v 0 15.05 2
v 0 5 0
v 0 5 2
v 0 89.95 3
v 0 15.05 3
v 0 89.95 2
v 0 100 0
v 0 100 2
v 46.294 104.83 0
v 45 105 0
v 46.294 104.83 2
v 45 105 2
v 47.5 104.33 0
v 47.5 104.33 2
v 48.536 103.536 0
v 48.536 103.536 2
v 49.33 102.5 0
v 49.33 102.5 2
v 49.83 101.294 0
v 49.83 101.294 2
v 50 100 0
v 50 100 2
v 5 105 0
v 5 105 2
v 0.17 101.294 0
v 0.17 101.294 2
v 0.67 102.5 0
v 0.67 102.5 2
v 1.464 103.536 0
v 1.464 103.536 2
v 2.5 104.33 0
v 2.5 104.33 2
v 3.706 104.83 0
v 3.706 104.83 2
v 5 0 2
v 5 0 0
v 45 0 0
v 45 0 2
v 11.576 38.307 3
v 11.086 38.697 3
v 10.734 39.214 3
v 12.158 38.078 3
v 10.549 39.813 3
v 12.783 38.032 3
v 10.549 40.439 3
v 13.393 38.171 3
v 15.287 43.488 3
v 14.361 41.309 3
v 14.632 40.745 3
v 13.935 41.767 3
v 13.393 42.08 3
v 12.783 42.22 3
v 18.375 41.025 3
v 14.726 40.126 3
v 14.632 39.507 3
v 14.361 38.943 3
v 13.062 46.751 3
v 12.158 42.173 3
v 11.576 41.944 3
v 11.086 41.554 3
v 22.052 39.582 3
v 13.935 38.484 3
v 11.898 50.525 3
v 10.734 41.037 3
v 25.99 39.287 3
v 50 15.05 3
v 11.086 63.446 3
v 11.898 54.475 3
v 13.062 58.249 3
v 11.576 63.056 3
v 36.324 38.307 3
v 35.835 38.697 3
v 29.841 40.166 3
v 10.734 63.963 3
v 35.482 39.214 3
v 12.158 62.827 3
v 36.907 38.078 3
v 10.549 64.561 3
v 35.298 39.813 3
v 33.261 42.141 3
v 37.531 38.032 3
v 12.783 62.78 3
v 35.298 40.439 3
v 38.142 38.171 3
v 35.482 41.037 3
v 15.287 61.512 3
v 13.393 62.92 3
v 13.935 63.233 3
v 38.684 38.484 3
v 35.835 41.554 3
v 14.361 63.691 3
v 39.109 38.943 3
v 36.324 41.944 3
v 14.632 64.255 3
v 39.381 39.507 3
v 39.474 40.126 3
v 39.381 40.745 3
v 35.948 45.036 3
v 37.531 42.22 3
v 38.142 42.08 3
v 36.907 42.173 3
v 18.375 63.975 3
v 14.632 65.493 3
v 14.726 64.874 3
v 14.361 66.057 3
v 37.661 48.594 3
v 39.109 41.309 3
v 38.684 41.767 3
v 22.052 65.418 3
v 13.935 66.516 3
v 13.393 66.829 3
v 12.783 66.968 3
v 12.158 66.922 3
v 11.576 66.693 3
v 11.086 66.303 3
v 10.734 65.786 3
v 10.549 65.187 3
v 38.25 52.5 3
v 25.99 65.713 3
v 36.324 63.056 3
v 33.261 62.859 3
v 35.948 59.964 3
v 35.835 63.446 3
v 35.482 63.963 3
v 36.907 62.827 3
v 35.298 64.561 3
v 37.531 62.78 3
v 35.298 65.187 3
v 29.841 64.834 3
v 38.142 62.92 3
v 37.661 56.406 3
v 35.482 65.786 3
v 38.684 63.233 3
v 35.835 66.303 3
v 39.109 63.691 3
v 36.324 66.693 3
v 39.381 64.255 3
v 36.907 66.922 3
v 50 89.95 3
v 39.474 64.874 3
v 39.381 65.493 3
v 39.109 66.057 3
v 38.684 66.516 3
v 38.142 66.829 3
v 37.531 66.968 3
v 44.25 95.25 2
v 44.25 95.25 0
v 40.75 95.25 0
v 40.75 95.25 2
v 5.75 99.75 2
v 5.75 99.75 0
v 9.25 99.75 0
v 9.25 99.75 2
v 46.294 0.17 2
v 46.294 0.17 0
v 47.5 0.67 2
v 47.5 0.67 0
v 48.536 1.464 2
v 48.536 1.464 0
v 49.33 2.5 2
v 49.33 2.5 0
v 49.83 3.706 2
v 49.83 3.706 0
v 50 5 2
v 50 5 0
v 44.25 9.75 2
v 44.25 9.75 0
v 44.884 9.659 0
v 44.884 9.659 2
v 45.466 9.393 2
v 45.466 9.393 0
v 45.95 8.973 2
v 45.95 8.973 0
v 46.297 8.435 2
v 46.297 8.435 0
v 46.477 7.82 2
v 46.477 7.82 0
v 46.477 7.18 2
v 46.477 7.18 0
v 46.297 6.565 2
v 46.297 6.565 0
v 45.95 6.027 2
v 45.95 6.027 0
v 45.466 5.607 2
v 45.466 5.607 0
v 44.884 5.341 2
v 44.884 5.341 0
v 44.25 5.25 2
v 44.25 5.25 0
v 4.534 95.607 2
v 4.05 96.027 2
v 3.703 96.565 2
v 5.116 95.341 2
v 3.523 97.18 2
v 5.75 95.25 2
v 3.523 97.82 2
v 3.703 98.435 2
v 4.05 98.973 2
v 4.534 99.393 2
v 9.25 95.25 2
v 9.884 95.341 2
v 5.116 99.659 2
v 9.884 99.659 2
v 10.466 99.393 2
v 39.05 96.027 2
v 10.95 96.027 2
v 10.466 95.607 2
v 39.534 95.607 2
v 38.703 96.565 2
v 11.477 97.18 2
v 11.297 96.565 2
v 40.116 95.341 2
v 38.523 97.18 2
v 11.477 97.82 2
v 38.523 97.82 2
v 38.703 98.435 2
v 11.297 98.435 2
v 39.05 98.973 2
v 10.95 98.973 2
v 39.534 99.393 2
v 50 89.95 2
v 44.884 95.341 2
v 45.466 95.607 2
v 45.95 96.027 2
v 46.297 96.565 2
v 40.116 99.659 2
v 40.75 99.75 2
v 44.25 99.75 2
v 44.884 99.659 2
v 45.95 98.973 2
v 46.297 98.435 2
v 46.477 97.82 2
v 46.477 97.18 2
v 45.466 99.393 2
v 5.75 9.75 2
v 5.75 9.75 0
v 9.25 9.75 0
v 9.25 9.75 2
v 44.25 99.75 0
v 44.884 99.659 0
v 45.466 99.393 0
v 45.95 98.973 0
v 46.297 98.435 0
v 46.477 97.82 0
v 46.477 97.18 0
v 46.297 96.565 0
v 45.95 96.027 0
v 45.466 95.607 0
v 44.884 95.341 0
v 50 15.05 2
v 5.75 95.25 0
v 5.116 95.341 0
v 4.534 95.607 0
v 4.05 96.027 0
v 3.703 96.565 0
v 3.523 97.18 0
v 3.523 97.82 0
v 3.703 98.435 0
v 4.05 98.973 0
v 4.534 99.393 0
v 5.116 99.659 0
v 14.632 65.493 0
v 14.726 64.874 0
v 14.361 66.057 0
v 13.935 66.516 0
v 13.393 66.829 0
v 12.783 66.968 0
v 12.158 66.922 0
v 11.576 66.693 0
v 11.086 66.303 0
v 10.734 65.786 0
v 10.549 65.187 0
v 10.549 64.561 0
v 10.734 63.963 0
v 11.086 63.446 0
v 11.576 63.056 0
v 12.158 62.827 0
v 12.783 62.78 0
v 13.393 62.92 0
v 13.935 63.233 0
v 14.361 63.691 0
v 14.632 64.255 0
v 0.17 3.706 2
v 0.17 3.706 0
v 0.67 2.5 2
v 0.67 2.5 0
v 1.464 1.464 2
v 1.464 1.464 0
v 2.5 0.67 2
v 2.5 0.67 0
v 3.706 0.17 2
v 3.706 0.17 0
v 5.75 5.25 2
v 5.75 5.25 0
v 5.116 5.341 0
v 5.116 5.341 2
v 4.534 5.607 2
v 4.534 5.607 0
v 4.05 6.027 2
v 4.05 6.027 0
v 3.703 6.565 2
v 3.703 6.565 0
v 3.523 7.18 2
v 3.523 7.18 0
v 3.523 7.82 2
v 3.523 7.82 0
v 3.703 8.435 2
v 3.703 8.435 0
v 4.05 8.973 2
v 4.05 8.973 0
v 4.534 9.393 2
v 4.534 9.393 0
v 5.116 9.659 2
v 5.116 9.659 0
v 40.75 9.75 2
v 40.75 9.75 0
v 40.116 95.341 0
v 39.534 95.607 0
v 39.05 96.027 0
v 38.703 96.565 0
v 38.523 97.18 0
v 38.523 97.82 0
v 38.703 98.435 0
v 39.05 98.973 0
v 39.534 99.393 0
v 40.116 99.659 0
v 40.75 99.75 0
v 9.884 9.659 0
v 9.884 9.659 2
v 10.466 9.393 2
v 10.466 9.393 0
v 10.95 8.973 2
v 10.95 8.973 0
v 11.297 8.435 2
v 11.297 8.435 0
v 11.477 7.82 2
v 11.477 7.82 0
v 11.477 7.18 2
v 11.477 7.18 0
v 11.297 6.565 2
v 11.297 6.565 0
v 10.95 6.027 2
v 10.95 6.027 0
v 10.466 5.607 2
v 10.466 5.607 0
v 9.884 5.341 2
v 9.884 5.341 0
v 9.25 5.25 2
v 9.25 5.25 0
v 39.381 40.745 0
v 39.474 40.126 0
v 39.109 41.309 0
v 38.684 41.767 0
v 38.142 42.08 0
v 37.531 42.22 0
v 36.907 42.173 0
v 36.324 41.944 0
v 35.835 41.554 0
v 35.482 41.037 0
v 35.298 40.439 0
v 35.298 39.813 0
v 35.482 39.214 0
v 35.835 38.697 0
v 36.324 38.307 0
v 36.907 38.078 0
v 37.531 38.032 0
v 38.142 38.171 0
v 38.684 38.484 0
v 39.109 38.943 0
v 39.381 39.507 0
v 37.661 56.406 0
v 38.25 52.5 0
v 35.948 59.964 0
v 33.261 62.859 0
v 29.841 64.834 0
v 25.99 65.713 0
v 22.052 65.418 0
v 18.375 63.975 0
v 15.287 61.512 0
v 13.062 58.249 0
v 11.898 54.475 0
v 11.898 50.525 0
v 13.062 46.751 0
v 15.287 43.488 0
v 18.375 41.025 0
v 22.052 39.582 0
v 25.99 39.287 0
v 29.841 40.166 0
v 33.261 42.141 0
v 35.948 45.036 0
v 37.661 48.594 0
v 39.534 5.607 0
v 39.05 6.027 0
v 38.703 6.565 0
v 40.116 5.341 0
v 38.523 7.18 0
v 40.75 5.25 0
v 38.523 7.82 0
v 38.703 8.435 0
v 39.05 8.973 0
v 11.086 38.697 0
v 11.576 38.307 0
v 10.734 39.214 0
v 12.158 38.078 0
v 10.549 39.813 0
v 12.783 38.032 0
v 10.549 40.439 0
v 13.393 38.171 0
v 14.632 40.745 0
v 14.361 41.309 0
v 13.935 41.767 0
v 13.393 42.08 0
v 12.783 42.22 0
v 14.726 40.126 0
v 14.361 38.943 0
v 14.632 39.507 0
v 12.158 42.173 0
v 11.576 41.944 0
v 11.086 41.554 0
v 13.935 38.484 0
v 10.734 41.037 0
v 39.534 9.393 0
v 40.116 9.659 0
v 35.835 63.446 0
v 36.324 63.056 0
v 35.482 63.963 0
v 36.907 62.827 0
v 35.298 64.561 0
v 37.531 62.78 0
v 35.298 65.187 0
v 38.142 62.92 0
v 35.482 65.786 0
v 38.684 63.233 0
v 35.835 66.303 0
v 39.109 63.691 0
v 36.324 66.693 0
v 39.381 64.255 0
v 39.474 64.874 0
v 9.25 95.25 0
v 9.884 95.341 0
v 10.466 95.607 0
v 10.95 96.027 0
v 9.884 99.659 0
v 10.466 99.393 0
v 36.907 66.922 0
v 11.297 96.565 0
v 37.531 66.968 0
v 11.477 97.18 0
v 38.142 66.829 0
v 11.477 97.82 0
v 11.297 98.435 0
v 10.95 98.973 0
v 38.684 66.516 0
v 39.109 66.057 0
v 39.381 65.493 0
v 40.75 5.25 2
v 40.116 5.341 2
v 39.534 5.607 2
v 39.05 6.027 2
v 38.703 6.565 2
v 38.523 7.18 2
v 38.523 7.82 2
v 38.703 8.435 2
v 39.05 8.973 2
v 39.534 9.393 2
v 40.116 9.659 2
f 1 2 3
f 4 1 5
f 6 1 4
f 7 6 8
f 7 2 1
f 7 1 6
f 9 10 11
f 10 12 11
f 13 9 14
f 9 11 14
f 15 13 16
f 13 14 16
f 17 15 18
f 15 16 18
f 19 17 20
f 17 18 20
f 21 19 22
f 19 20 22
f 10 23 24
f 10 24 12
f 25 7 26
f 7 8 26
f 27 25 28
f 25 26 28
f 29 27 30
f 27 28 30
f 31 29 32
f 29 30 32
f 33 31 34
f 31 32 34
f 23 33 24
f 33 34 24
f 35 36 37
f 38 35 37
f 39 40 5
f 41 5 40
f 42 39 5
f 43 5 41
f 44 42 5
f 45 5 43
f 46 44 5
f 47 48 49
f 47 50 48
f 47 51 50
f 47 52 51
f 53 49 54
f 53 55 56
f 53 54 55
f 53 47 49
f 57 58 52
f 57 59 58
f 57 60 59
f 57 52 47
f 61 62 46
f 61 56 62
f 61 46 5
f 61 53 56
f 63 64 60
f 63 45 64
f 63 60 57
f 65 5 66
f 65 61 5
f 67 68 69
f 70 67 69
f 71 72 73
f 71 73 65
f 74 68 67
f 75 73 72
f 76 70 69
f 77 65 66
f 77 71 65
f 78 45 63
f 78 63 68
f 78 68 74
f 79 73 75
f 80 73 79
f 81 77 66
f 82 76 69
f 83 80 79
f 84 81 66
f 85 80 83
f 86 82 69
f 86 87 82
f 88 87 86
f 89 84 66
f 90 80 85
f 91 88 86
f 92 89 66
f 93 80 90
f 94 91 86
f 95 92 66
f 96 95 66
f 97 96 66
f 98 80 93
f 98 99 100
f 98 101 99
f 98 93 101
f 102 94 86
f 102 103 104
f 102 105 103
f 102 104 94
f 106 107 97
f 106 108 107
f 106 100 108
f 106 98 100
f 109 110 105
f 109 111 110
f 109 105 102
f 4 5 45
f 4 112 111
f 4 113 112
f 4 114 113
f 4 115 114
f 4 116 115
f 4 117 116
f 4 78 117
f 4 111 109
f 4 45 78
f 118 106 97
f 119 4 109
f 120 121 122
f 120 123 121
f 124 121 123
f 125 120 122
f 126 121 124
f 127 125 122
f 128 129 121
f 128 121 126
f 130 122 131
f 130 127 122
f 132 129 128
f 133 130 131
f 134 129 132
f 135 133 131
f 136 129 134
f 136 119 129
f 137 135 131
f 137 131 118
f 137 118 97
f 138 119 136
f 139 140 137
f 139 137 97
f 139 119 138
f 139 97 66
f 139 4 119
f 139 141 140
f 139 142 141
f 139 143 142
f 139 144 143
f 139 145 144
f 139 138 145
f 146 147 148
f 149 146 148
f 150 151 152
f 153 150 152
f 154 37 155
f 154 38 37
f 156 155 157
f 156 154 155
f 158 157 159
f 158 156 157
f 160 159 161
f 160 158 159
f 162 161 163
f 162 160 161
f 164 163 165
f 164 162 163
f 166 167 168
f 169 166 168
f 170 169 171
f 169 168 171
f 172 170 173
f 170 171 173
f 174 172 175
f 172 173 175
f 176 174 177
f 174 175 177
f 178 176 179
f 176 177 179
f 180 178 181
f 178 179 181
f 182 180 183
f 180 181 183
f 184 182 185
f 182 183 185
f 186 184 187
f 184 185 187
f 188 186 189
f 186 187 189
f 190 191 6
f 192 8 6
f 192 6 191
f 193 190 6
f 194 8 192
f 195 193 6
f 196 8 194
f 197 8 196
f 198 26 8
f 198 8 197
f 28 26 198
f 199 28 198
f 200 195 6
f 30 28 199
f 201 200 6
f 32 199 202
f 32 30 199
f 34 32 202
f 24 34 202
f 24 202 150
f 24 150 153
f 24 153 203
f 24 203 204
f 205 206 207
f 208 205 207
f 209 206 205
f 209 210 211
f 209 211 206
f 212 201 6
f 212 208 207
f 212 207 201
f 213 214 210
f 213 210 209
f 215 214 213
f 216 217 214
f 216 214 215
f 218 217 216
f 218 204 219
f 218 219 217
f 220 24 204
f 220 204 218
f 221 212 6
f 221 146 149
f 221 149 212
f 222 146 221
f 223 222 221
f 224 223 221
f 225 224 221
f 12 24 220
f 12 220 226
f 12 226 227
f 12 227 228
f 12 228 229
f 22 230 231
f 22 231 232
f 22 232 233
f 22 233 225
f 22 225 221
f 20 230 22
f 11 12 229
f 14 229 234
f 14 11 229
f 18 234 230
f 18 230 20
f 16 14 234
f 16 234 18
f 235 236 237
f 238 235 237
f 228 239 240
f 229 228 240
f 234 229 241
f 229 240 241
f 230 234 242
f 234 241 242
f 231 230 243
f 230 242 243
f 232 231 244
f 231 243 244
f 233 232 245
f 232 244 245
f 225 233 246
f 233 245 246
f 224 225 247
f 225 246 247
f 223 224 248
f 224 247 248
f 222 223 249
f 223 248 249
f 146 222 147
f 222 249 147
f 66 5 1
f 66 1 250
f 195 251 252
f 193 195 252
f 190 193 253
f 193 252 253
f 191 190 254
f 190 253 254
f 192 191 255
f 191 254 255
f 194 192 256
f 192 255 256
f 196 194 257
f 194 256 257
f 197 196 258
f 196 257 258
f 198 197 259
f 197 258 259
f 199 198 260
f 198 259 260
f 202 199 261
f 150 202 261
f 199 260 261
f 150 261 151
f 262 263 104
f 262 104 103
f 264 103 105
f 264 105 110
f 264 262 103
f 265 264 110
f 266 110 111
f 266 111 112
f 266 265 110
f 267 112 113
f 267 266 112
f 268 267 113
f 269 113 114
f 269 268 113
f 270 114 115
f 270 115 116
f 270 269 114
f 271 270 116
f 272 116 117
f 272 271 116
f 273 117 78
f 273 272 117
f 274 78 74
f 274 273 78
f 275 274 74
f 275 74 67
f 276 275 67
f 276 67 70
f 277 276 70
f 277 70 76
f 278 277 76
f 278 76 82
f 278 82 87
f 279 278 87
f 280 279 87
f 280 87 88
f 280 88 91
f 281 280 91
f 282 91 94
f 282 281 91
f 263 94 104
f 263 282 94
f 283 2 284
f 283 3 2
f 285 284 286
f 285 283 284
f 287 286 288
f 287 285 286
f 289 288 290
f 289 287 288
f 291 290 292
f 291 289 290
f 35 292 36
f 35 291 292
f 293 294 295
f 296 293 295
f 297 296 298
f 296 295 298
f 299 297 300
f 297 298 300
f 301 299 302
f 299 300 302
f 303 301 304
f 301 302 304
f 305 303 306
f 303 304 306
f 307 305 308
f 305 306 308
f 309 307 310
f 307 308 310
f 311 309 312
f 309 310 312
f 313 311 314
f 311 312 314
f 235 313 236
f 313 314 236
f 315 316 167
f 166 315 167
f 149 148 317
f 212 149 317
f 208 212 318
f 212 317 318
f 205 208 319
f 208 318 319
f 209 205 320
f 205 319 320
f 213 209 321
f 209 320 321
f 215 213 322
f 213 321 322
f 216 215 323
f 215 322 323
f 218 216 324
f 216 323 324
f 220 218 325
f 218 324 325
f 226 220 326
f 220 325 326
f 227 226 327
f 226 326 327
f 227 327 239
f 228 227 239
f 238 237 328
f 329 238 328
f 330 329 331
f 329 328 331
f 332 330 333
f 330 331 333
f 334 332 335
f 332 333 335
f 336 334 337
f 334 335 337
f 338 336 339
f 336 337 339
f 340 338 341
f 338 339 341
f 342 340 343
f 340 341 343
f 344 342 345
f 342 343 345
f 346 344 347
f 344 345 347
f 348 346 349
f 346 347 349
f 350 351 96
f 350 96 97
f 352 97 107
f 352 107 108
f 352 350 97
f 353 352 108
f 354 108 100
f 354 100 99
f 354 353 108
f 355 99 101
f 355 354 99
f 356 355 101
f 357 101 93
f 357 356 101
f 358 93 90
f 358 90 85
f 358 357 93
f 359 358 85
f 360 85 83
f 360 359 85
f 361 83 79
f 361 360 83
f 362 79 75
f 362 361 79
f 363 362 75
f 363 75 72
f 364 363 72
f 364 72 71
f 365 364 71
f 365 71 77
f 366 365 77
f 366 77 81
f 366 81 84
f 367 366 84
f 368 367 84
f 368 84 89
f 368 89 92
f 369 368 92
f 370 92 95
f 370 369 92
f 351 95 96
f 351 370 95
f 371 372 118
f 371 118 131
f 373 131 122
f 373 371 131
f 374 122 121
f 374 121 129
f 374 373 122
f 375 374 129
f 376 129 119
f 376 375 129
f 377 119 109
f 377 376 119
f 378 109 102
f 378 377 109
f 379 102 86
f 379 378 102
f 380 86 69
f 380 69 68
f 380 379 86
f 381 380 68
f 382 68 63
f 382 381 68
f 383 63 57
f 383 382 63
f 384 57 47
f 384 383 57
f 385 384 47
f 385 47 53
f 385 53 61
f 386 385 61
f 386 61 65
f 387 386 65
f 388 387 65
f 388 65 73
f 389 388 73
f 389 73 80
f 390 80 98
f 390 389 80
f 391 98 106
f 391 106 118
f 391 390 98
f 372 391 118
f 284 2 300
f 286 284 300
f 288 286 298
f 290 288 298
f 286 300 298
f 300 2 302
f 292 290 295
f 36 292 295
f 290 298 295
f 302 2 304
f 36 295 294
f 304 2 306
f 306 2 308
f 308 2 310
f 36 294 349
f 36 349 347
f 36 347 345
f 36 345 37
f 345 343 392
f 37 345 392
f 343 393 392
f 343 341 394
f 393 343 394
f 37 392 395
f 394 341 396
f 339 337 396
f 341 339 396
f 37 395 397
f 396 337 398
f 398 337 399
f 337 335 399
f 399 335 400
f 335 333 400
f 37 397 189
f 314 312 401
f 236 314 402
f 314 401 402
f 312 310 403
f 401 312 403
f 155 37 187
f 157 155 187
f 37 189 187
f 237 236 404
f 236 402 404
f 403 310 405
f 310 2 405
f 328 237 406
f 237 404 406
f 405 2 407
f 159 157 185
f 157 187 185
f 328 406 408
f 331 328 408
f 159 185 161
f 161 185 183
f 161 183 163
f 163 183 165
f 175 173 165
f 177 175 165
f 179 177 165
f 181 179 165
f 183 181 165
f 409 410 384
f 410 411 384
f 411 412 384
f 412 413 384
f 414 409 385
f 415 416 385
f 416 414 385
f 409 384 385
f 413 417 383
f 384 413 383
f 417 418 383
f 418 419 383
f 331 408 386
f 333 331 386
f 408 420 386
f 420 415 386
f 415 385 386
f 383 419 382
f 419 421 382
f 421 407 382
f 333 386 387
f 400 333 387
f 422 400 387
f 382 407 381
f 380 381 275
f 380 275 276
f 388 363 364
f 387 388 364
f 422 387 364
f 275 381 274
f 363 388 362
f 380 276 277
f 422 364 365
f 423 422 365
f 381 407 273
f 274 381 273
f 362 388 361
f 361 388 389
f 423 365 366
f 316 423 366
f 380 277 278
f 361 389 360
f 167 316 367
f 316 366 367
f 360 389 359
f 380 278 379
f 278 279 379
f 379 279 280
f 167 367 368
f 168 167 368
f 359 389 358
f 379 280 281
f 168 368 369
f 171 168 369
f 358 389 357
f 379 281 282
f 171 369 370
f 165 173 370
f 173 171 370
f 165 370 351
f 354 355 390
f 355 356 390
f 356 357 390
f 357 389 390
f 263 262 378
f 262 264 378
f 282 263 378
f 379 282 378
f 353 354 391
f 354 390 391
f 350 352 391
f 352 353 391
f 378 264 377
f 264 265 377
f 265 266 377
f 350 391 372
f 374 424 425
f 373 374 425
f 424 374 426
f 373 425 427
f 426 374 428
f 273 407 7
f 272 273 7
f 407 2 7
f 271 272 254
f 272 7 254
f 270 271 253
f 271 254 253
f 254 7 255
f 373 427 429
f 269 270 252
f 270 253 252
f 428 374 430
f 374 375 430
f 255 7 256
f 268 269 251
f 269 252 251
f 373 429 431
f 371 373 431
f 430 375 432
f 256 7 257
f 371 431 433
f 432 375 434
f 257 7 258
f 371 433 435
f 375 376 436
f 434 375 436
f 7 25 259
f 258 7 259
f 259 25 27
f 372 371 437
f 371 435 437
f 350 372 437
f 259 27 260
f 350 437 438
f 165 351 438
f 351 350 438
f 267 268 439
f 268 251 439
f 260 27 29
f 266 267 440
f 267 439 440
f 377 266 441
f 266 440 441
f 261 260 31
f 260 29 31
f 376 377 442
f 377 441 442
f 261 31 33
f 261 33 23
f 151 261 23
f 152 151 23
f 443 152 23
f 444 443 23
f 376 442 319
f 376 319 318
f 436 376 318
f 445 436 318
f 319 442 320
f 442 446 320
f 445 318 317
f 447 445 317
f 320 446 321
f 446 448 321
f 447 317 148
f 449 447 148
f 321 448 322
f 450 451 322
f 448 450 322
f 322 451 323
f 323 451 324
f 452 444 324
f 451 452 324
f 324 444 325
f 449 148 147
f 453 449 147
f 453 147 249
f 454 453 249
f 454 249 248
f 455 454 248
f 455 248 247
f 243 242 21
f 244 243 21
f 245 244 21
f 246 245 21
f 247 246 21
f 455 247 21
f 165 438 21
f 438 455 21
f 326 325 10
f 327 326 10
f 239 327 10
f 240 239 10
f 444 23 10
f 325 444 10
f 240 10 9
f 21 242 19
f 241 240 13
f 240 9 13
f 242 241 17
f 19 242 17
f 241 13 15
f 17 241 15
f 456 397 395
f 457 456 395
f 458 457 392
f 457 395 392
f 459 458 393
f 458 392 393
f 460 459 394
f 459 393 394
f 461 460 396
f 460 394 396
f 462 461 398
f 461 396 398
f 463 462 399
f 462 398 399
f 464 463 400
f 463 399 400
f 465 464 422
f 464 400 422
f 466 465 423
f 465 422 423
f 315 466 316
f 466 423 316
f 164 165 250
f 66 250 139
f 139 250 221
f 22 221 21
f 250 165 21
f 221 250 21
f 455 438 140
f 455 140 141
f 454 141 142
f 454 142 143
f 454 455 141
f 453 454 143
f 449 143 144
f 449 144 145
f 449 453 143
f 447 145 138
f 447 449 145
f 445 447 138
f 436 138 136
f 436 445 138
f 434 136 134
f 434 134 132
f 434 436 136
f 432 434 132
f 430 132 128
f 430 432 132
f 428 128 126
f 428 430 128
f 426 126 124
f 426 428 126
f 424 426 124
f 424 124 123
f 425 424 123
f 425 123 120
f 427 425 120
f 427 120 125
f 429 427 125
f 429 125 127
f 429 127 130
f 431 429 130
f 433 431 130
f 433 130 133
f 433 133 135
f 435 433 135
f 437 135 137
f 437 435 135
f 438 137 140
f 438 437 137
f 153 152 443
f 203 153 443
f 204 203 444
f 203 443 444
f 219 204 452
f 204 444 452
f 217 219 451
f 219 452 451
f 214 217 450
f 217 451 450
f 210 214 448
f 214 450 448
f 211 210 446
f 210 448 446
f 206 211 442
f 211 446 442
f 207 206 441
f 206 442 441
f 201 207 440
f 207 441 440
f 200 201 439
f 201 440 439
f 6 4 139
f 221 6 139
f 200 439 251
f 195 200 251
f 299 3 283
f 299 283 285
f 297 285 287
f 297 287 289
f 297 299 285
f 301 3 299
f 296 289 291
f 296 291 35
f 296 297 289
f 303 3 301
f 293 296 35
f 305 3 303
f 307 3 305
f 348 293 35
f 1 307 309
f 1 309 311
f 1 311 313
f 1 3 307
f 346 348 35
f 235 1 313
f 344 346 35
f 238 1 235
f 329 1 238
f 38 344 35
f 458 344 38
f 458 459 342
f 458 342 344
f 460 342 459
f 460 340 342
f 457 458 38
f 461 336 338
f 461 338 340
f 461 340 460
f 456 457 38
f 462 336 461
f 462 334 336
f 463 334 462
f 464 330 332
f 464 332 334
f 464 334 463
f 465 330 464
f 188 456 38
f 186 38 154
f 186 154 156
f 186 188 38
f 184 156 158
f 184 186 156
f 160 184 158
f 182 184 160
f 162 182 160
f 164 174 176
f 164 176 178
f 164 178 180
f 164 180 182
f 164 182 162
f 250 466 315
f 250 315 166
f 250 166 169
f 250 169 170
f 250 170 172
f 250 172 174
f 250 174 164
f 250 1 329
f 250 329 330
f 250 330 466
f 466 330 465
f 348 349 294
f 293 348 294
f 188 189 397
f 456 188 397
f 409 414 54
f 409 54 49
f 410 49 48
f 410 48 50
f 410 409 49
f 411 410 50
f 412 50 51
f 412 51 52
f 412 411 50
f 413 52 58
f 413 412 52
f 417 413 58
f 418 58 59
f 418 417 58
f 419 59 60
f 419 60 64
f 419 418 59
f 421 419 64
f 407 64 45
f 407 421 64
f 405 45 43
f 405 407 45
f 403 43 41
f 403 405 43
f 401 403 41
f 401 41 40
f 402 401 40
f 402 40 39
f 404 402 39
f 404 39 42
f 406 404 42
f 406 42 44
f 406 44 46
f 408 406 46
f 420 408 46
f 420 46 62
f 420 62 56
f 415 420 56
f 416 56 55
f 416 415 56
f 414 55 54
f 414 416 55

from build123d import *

# Parameters (mm, degrees)
SKETCH_2_W          = 50
SKETCH_2_H          = 105
SKETCH_2_R          = 13.25
SKETCH_2_R_2        = 2.1
EXTRUDE_1_DEPTH     = 3
SKETCH_3_W          = 50
SKETCH_3_H          = 15.05
CUT_EXTRUDE_1_DEPTH = 1
FILLET_1_R          = 5


with BuildPart() as part:
    # ｽｹｯﾁ2 → ﾎﾞｽ - 押し出し1 (new body)
    with BuildSketch(Plane.XY):
        with Locations((25, 52.5)):
            Rectangle(SKETCH_2_W, SKETCH_2_H)
        with Locations((25, 52.5)):
            Circle(SKETCH_2_R, mode=Mode.SUBTRACT)
        with Locations((37.374368671, 64.874368671)):
            Circle(SKETCH_2_R_2, mode=Mode.SUBTRACT)
        with Locations((12.625631329, 64.874368671)):
            Circle(SKETCH_2_R_2, mode=Mode.SUBTRACT)
        with Locations((37.374368671, 40.125631329)):
            Circle(SKETCH_2_R_2, mode=Mode.SUBTRACT)
        with Locations((12.625631329, 40.125631329)):
            Circle(SKETCH_2_R_2, mode=Mode.SUBTRACT)
        with BuildLine():
            Line((5.75, 9.75), (9.25, 9.75))
            ThreePointArc((9.25, 9.75), (11.5, 7.5), (9.25, 5.25))
            Line((9.25, 5.25), (5.75, 5.25))
            ThreePointArc((5.75, 5.25), (3.5, 7.5), (5.75, 9.75))
        make_face(mode=Mode.SUBTRACT)
        with BuildLine():
            Line((40.750000202, 9.75), (44.250000202, 9.75))
            ThreePointArc((44.250000202, 9.75), (46.500000202, 7.5), (44.250000202, 5.25))
            Line((44.250000202, 5.25), (40.750000202, 5.25))
            ThreePointArc((40.750000202, 5.25), (38.500000202, 7.5), (40.750000202, 9.75))
        make_face(mode=Mode.SUBTRACT)
        with BuildLine():
            Line((40.750000101, 99.75), (44.250000101, 99.75))
            ThreePointArc((44.250000101, 99.75), (46.500000101, 97.5), (44.250000101, 95.25))
            Line((44.250000101, 95.25), (40.750000101, 95.25))
            ThreePointArc((40.750000101, 95.25), (38.500000101, 97.5), (40.750000101, 99.75))
        make_face(mode=Mode.SUBTRACT)
        with BuildLine():
            Line((5.749999899, 99.75), (9.249999899, 99.75))
            ThreePointArc((9.249999899, 99.75), (11.499999899, 97.5), (9.249999899, 95.25))
            Line((9.249999899, 95.25), (5.749999899, 95.25))
            ThreePointArc((5.749999899, 95.25), (3.499999899, 97.5), (5.749999899, 99.75))
        make_face(mode=Mode.SUBTRACT)
    extrude(amount=EXTRUDE_1_DEPTH)

    # ｽｹｯﾁ3 → ｶｯﾄ - 押し出し1 (cut)
    with BuildSketch(Plane.XY.offset(3)):
        with Locations((25, 97.475)):
            Rectangle(SKETCH_3_W, SKETCH_3_H)
        with Locations((25, 7.525)):
            Rectangle(SKETCH_3_W, SKETCH_3_H)
    extrude(amount=-CUT_EXTRUDE_1_DEPTH, mode=Mode.SUBTRACT)

    # ﾌｨﾚｯﾄ1
    fillet_1_edges = [part.edges().sort_by_distance(p)[0] for p in [
        (0, 105, 1),
        (50, 105, 1),
        (50, 0, 1),
        (0, 0, 1),
    ]]
    fillet(fillet_1_edges, radius=FILLET_1_R)


solid = part.part
